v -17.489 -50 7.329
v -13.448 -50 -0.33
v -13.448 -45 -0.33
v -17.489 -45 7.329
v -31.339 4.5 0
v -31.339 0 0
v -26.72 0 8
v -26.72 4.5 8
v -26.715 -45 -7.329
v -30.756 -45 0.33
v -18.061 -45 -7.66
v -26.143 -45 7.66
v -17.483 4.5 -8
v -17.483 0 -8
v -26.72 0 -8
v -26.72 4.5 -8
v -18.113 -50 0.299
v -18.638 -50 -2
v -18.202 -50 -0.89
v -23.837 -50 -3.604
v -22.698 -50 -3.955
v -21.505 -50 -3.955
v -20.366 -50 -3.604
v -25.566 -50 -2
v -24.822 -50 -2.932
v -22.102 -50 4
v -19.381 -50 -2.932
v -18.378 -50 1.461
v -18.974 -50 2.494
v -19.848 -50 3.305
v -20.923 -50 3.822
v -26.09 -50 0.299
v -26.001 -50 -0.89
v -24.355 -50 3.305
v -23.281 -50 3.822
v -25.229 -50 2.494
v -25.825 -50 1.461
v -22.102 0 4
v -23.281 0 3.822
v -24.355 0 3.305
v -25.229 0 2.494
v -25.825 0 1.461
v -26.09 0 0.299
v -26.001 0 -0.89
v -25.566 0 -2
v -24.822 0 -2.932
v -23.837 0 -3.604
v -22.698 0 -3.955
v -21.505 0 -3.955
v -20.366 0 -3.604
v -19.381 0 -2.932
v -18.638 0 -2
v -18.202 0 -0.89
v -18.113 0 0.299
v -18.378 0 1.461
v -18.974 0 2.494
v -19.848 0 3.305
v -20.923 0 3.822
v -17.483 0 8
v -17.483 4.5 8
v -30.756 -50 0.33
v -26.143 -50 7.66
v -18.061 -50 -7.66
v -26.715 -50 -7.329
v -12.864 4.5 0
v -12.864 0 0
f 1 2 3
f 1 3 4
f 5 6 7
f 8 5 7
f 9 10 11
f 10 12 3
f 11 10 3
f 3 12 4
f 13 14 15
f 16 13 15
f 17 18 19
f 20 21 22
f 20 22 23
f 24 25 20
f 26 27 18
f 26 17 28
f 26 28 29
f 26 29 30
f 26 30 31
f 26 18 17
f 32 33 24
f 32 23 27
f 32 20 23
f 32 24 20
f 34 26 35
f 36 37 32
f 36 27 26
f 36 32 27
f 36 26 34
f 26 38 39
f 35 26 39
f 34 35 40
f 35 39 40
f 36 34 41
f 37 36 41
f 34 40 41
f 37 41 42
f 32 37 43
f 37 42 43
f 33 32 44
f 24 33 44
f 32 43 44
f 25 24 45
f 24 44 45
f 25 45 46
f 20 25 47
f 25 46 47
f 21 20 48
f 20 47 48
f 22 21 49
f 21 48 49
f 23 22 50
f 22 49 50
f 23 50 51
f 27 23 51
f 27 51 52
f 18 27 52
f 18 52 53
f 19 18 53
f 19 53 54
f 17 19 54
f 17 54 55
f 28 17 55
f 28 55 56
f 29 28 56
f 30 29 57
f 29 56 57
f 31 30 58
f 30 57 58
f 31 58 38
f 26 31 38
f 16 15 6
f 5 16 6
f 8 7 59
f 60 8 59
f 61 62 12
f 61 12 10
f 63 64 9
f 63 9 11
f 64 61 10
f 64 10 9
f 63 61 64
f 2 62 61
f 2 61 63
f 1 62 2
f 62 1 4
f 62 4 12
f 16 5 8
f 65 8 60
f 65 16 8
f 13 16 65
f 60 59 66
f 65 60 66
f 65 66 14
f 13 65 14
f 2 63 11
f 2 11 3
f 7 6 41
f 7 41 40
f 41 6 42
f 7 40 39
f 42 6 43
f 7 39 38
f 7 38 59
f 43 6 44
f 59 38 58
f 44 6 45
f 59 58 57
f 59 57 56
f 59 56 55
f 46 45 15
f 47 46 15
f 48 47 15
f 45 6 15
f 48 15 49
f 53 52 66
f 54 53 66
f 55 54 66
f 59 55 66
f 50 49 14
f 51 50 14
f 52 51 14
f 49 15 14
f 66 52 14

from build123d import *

# Parameters (mm, degrees)
EXTRUDE_1_DEPTH = 4.5
SKETCH_2_R      = 4
EXTRUDE_2_DEPTH = 50
EXTRUDE_3_DEPTH = 5


with BuildPart() as part:
    # 草图1 → 凸台-拉伸1 (new body)
    with BuildSketch(Plane(origin=(0, 0, 0), x_dir=(1, 0, 0), z_dir=(0, 1, 0))):
        Polygon((-12.864054172, 0), (-17.482856325, 8), (-26.720460632, 8), (-31.339262786, 0), (-26.720460632, -8), (-17.482856325, -8), align=None)
    extrude(amount=EXTRUDE_1_DEPTH)

    # 草图2 → 凸台-拉伸2 (add)
    with BuildSketch(Plane.XZ):
        with Locations(Location((-22.101658479, 0, 0), (0, 0, 90))):
            Circle(SKETCH_2_R)
    extrude(amount=EXTRUDE_2_DEPTH)


with BuildPart() as body_2:
    # 草图3 → 凸台-拉伸3 (new body)
    with BuildSketch(Plane.XZ.offset(50)):
        Polygon((-13.447703682, -0.330251979), (-17.488674477, 7.329418708), (-26.142629274, 7.659670687), (-30.755613276, 0.330251979), (-26.714642481, -7.329418708), (-18.060687684, -7.659670687), align=None)
    extrude(amount=-EXTRUDE_3_DEPTH)


solid = Compound([part.part, body_2.part])
